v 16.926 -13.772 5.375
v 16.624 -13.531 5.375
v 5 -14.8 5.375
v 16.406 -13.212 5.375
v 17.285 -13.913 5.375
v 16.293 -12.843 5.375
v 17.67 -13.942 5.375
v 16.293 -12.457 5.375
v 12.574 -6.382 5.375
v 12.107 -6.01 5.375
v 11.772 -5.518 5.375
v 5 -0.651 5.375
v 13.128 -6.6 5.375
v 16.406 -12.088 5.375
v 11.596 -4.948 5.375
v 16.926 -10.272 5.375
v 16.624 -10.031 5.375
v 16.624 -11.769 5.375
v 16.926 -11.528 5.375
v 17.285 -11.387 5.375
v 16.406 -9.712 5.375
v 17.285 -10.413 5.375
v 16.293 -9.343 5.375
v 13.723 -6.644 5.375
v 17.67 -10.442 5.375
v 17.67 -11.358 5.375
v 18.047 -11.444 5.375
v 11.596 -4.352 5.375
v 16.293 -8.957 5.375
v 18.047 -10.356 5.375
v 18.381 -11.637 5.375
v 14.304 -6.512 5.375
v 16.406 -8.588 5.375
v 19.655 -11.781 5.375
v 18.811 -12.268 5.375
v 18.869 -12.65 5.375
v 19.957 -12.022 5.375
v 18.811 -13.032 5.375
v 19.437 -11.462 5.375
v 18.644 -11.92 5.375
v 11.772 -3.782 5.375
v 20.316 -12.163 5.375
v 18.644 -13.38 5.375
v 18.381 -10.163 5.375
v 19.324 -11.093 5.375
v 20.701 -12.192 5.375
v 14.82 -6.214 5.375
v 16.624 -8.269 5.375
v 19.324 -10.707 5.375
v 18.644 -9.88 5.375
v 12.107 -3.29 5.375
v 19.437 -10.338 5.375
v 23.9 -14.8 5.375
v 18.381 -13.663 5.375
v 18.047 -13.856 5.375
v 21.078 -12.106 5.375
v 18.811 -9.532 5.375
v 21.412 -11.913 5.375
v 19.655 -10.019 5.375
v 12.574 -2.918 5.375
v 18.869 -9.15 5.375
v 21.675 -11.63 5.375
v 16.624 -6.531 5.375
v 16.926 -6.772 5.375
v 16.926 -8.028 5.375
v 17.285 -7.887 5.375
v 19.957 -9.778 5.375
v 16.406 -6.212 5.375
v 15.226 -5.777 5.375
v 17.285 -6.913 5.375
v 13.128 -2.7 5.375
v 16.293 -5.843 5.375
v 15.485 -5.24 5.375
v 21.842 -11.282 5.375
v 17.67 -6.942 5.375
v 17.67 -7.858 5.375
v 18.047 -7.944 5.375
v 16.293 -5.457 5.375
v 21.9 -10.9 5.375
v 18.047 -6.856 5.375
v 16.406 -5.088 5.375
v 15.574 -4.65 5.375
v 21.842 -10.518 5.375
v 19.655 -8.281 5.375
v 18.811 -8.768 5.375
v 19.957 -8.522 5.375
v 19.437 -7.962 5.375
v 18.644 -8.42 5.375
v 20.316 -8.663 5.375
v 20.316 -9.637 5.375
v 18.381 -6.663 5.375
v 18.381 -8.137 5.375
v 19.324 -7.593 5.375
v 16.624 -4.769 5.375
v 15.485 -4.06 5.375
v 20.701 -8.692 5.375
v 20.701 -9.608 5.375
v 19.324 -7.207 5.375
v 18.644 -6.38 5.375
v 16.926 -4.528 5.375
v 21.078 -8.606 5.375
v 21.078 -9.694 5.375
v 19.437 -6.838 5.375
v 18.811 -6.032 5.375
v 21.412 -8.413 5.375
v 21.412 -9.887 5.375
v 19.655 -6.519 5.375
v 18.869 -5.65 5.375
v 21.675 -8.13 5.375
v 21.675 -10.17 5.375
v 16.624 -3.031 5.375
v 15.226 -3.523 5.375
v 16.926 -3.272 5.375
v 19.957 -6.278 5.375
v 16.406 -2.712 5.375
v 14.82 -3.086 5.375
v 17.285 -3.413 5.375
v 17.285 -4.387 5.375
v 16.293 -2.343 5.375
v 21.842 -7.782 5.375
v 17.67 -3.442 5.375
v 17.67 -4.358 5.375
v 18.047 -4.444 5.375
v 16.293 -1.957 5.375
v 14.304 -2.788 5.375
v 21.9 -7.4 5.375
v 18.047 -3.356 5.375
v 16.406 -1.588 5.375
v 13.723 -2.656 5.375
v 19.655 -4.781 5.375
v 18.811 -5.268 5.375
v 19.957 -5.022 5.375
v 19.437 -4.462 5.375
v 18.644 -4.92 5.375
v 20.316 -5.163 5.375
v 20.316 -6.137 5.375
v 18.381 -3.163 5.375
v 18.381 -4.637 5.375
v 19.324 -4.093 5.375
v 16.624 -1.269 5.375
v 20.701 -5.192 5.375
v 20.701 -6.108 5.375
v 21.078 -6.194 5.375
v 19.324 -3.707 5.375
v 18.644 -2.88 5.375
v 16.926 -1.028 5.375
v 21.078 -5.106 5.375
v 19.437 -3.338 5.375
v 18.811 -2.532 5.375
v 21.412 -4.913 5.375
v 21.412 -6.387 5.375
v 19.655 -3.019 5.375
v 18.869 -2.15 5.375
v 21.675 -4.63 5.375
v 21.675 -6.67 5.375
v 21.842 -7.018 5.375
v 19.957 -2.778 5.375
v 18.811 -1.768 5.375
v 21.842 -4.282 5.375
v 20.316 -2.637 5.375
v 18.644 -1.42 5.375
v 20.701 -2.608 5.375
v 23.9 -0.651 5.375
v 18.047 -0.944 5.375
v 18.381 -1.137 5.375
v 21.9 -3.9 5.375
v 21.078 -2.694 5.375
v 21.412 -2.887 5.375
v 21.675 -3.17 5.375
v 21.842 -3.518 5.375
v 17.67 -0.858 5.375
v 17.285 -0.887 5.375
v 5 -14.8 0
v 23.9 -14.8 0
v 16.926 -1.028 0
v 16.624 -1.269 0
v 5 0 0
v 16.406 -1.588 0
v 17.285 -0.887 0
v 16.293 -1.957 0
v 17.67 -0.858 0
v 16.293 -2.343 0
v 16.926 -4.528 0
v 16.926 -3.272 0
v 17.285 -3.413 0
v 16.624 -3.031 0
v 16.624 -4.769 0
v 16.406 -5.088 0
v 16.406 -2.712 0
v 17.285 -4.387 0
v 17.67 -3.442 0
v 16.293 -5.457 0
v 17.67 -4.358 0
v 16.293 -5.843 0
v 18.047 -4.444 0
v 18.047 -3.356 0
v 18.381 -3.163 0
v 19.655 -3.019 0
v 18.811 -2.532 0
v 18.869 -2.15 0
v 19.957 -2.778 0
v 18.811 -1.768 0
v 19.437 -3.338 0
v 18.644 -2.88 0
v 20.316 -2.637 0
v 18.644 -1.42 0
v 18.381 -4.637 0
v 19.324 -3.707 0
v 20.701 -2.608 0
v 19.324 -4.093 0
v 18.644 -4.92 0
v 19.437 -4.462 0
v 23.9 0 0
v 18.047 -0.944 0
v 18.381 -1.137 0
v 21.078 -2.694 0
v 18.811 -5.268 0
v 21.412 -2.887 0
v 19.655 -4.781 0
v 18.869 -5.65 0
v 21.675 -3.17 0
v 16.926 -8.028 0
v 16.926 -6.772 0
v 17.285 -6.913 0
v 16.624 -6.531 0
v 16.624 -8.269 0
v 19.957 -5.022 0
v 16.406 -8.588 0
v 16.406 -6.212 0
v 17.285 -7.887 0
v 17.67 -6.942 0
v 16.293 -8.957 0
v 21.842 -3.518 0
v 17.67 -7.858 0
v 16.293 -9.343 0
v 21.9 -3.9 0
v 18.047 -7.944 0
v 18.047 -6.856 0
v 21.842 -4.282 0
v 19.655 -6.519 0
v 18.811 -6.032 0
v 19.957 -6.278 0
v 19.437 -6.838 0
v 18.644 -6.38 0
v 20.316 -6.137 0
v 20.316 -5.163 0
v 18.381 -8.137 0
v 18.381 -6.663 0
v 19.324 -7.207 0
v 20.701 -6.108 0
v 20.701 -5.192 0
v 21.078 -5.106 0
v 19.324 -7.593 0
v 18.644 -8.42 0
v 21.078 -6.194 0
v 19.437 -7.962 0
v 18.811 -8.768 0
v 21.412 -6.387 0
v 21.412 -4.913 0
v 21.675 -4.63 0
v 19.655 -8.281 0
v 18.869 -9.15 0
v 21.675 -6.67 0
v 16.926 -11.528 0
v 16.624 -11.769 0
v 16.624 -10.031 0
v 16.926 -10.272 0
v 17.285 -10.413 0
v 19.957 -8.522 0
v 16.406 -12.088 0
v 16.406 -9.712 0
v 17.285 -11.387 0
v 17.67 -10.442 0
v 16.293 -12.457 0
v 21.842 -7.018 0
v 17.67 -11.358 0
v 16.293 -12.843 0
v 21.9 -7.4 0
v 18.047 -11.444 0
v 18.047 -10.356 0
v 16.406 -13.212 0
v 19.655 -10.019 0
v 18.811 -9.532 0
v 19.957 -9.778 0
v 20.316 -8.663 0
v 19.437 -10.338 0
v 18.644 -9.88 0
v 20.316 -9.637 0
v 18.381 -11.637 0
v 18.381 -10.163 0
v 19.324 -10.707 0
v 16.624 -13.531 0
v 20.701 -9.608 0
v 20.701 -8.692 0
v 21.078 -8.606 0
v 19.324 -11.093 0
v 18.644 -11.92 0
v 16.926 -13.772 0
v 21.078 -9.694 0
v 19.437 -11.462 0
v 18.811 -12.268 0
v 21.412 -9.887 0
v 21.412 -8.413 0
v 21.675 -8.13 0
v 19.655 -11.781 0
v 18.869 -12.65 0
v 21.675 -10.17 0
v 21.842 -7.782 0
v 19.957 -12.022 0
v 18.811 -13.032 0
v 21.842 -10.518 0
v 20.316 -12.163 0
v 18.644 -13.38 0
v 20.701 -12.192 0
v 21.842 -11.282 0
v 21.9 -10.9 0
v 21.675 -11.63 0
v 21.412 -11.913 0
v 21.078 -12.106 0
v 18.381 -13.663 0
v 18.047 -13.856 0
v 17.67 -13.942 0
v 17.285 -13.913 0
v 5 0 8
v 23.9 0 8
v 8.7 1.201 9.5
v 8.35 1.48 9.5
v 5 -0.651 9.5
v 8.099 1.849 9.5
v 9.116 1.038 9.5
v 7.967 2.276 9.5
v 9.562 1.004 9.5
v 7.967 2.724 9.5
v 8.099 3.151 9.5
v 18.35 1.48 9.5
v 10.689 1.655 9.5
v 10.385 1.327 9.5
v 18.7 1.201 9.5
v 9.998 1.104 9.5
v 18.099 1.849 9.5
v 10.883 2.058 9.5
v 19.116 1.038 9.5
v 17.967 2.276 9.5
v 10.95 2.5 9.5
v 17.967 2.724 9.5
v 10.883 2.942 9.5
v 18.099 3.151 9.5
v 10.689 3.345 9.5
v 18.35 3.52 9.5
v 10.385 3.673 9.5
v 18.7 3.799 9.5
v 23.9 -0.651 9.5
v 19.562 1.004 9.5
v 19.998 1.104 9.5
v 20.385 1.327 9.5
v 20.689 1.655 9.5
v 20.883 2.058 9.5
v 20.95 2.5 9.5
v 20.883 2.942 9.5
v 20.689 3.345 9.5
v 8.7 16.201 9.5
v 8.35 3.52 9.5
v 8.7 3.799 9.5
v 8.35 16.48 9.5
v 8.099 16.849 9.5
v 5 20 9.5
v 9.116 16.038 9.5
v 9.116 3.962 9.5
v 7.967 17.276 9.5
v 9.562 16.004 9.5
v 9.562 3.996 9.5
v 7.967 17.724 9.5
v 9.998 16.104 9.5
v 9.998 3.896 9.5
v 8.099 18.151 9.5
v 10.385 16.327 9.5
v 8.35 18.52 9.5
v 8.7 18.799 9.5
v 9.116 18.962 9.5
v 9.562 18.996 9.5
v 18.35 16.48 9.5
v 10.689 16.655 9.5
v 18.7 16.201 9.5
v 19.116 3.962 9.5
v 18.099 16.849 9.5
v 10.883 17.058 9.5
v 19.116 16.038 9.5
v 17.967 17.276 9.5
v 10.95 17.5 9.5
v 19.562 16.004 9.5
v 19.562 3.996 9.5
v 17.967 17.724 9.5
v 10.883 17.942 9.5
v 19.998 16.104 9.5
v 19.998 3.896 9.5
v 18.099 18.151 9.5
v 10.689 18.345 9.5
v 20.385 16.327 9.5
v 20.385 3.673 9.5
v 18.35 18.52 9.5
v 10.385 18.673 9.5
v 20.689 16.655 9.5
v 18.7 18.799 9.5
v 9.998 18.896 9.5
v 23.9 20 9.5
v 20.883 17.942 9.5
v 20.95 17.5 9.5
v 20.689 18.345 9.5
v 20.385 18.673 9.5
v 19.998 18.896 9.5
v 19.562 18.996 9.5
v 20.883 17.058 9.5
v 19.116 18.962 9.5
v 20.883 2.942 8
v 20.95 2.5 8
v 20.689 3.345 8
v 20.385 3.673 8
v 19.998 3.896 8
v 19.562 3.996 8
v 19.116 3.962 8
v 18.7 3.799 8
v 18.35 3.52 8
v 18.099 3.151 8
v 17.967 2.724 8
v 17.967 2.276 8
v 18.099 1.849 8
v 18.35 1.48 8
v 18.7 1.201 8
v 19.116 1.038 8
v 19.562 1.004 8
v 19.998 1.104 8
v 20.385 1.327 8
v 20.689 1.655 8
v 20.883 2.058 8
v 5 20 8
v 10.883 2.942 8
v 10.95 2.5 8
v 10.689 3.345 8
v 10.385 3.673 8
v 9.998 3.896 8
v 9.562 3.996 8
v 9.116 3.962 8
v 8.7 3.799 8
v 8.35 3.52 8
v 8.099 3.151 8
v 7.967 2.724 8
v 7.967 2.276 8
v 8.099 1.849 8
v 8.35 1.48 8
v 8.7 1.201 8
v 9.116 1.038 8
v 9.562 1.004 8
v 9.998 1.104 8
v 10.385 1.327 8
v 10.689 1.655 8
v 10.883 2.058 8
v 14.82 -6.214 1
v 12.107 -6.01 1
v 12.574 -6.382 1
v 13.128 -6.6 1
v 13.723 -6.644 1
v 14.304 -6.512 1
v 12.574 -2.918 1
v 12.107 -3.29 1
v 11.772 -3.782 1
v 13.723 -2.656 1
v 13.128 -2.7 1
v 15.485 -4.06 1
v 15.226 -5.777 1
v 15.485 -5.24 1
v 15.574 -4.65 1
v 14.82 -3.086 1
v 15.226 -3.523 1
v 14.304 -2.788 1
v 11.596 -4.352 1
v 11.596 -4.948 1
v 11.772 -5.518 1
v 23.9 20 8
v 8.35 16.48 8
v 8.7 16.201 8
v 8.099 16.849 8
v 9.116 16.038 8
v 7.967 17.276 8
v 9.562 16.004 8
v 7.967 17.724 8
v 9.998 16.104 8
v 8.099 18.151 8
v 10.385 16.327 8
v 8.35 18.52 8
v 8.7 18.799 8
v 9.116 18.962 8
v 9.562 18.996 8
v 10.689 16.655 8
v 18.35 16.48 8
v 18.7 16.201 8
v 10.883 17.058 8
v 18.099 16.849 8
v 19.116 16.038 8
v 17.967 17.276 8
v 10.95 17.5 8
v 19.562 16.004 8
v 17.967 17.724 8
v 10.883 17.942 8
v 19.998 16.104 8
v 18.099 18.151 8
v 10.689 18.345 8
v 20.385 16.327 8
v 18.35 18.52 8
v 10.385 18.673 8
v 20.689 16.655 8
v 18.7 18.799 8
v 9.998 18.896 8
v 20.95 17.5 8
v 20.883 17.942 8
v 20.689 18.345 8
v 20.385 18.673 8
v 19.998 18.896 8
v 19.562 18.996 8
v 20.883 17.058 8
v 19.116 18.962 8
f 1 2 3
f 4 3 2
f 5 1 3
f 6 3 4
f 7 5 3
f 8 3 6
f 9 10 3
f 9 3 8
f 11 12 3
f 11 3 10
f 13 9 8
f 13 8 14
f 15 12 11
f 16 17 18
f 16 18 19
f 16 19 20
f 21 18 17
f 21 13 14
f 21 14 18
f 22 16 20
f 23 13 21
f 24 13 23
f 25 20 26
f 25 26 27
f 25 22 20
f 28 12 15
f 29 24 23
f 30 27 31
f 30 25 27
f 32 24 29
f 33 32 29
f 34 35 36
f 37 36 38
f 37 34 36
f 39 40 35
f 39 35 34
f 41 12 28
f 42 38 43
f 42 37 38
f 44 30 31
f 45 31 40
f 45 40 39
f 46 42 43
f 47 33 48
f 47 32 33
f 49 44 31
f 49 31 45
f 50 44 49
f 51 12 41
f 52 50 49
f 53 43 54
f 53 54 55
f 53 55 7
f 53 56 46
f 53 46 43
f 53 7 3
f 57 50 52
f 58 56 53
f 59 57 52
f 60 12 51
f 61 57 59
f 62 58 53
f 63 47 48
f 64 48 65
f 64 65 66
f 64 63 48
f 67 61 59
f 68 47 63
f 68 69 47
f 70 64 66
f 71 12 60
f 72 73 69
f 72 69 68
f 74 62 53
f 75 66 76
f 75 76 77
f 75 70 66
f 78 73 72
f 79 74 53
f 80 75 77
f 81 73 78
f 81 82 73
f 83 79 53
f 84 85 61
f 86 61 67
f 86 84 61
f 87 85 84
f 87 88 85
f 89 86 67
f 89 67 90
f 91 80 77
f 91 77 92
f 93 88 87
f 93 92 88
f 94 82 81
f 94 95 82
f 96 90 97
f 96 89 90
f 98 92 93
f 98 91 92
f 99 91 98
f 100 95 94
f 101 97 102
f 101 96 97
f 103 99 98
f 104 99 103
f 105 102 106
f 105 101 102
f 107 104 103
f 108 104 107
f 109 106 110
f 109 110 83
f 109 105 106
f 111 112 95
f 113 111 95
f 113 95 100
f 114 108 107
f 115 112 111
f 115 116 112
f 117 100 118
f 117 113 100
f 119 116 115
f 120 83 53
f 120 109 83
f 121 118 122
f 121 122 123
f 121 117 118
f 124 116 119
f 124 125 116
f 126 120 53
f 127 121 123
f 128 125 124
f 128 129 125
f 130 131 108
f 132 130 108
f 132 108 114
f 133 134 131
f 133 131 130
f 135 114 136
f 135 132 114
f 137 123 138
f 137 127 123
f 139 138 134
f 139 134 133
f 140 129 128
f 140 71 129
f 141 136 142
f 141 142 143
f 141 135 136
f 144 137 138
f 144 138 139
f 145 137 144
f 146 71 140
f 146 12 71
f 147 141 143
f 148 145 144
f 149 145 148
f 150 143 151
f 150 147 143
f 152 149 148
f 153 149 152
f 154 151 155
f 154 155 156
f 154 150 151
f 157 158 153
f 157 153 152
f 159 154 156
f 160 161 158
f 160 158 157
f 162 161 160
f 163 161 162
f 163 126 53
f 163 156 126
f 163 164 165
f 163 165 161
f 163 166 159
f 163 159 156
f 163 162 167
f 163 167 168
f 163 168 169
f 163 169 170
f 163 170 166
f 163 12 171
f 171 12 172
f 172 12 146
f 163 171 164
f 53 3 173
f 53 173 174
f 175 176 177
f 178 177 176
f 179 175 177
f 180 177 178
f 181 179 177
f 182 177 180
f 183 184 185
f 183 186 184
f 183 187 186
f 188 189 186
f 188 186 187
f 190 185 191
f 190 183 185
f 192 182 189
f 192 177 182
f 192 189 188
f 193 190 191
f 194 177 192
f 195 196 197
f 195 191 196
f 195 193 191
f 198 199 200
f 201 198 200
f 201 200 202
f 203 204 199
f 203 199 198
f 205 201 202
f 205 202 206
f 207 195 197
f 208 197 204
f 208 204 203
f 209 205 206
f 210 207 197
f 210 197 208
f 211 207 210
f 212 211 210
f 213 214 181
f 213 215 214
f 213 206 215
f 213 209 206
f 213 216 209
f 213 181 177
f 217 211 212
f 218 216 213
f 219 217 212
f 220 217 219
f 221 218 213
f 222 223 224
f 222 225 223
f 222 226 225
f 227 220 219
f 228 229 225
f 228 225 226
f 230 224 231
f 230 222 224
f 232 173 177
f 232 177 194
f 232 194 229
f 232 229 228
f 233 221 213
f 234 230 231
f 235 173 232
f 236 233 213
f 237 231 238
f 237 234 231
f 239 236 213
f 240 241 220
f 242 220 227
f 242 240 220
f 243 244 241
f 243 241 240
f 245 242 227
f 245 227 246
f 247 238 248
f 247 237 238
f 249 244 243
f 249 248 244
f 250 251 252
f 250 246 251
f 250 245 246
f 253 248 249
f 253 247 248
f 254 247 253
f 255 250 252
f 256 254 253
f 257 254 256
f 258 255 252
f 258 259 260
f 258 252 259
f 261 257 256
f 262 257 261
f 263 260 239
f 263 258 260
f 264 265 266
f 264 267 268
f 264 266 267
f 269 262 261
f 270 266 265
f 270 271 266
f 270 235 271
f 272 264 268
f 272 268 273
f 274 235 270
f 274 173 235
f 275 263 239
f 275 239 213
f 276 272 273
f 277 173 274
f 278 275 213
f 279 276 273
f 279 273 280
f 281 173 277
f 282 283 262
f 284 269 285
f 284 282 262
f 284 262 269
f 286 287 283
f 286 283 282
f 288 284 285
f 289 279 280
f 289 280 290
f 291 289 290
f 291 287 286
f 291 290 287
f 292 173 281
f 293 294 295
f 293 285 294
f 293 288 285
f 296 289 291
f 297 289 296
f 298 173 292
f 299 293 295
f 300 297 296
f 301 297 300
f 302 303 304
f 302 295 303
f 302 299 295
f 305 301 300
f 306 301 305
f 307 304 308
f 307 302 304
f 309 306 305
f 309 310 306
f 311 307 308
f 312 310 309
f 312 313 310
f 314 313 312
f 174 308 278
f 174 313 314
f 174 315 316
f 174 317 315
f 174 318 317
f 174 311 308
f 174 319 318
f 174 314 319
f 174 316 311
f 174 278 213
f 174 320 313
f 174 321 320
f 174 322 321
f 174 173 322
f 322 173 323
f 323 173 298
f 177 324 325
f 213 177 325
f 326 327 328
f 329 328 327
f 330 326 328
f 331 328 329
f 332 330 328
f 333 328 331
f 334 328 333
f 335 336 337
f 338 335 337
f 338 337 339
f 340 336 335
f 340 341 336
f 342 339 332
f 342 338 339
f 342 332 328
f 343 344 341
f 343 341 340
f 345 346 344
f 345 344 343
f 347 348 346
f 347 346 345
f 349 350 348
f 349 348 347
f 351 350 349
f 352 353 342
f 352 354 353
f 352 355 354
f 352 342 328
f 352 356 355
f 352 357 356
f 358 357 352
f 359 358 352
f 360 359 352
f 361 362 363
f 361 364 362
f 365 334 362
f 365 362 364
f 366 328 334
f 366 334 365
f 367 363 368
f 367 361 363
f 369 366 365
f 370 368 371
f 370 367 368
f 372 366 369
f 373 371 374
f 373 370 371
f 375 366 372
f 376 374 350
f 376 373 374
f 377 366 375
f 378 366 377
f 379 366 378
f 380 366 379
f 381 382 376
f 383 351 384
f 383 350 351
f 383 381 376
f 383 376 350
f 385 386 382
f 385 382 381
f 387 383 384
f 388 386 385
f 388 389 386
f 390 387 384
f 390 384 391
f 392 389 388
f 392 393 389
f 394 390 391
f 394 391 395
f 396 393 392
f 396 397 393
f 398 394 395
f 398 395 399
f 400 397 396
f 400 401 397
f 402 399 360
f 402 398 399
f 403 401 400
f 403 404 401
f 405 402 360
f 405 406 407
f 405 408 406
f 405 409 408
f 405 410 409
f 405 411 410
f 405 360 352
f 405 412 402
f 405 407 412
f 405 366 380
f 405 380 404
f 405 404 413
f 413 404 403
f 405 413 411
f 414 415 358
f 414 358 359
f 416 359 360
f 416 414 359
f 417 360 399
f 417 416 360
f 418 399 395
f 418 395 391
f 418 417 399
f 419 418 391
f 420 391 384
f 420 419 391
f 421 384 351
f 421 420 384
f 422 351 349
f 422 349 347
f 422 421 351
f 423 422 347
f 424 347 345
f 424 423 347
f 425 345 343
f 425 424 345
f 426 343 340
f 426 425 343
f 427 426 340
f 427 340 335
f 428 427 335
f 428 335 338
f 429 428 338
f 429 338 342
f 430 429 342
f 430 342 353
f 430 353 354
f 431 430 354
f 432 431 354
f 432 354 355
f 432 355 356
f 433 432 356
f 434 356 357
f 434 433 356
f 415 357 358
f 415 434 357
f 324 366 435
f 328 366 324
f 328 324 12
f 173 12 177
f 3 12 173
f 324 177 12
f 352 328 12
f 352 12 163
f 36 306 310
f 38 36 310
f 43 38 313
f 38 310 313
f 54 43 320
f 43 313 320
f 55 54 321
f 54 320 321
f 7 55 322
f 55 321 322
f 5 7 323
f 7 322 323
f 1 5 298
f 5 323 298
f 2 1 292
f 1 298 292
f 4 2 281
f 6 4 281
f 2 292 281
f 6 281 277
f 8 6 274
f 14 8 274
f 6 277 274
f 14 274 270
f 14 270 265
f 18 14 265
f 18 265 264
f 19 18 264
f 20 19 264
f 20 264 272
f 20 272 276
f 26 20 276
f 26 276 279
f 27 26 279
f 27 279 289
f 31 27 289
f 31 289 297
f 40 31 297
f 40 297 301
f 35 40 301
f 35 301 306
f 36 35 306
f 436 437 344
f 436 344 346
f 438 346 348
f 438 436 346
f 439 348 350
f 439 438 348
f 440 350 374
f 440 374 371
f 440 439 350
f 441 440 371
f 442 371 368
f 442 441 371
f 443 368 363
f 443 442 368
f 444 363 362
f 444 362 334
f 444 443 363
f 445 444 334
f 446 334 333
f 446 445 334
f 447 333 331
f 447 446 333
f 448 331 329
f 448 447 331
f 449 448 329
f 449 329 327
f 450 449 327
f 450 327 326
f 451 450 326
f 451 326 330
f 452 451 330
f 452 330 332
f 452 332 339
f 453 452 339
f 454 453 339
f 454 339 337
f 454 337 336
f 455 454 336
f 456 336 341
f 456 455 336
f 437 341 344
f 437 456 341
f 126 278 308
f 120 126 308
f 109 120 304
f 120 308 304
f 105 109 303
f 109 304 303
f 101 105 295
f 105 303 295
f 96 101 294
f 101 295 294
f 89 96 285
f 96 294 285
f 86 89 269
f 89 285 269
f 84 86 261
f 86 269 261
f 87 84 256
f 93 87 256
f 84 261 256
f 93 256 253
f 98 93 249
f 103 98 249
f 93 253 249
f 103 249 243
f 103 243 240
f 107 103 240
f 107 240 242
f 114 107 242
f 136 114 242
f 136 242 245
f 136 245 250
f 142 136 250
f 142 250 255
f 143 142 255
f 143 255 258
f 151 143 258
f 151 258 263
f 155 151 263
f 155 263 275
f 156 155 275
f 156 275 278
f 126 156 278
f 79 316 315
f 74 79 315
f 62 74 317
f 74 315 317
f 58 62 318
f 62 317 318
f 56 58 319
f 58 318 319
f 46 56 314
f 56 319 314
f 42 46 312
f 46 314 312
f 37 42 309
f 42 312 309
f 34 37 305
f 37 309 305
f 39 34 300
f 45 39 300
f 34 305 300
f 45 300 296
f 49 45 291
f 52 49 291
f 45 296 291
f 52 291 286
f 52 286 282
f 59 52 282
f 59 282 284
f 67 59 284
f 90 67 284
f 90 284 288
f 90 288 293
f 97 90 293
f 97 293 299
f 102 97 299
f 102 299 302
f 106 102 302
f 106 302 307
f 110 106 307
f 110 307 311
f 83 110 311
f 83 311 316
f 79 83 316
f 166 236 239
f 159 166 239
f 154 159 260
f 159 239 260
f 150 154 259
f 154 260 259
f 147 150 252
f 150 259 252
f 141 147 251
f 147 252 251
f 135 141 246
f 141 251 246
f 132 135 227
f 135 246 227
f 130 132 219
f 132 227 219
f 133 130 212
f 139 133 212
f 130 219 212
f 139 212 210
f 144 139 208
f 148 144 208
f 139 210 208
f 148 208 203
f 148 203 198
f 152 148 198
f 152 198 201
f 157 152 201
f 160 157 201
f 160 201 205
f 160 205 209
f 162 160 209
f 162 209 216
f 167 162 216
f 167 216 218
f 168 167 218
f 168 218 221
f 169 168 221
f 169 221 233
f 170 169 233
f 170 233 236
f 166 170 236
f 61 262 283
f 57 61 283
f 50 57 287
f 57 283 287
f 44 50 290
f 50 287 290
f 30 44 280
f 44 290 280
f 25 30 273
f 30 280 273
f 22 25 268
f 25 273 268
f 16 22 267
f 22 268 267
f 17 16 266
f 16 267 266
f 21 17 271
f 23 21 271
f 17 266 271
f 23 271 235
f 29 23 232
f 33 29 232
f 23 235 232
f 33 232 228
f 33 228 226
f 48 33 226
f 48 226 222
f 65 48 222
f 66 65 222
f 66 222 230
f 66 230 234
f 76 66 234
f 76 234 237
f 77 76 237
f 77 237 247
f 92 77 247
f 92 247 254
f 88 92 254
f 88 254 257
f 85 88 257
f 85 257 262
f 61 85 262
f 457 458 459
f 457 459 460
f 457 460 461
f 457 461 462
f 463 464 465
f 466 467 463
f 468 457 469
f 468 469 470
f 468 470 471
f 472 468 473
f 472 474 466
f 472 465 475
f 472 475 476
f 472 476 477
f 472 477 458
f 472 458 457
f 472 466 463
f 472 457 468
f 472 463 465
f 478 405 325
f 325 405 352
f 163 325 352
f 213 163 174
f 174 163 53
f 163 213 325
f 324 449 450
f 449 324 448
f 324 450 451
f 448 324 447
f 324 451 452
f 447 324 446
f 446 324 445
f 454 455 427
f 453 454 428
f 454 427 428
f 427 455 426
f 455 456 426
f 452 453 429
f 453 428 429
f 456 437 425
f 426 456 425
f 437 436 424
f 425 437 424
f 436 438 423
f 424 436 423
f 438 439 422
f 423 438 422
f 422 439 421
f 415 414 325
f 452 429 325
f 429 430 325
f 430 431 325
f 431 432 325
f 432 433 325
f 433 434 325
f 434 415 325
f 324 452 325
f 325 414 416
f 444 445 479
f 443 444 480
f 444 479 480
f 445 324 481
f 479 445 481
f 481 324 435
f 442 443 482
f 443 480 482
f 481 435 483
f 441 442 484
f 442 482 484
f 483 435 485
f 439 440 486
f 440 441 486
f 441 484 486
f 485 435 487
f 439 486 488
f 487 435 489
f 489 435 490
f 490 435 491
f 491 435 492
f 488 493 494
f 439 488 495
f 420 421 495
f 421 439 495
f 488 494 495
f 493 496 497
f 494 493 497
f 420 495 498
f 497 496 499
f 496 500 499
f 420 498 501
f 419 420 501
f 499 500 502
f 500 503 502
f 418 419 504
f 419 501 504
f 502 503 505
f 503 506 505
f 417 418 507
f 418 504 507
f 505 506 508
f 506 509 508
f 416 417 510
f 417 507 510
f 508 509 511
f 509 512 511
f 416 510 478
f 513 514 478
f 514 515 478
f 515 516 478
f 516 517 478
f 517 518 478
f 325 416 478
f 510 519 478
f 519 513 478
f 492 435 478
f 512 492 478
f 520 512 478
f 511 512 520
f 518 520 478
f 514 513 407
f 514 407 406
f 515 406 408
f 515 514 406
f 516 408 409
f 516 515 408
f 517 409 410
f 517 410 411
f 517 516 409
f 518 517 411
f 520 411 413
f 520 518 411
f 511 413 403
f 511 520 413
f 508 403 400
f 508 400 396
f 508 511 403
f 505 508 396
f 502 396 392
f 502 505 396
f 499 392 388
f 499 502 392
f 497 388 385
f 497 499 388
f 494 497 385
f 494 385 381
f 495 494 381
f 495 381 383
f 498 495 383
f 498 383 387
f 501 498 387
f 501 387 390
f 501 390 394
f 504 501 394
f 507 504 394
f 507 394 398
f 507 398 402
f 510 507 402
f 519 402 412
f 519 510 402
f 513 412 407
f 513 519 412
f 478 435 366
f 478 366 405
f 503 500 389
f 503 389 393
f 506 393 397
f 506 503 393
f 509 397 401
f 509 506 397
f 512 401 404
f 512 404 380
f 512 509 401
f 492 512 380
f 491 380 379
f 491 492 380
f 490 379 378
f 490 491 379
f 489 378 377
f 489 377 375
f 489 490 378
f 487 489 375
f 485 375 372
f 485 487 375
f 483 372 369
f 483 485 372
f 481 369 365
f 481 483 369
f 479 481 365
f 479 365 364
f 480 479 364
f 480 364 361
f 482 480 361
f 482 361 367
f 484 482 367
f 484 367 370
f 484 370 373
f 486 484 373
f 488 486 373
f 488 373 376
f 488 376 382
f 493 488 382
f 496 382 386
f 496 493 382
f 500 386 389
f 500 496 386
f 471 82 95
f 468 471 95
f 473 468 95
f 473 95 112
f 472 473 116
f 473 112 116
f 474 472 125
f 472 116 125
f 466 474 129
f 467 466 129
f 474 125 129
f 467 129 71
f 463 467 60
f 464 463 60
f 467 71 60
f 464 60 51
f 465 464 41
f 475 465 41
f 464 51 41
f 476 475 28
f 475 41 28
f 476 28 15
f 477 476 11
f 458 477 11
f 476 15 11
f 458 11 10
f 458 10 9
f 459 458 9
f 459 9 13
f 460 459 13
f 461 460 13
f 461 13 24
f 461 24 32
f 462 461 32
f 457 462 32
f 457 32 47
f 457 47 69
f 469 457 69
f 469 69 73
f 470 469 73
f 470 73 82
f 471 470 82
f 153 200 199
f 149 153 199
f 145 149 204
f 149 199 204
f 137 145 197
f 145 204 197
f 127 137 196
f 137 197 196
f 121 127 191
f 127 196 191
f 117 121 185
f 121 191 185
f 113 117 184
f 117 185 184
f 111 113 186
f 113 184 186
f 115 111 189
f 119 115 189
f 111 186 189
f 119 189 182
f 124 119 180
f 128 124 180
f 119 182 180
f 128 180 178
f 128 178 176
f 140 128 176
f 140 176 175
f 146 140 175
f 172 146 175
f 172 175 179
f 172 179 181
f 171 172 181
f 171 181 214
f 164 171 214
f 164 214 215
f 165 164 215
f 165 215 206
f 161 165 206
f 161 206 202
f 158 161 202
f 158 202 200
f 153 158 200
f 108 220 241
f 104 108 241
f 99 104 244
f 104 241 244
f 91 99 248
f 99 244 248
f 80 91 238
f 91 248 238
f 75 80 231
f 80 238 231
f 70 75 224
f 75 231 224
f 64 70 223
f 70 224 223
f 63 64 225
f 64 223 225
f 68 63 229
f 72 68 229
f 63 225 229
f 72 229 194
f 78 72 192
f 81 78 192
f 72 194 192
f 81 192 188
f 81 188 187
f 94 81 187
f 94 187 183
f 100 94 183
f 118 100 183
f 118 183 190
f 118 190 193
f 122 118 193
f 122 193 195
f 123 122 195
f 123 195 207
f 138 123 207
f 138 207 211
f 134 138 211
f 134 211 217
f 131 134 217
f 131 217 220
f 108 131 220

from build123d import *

# Parameters (mm, degrees)
SKETCH_W        = 18.9
SKETCH_H        = 34.8
SKETCH_R        = 1.5
PAD_DEPTH       = 1.5
SKETCH001_W     = 18.9
SKETCH001_H     = 14.8
PAD001_DEPTH    = 8
SKETCH002_R     = 1.2954
POCKET_DEPTH    = 9.501
SKETCH003_R     = 2
POCKET001_DEPTH = 8.5
SKETCH004_R     = 1.5
POCKET002_DEPTH = 1.001
SKETCH005_W     = 18.9
SKETCH005_H     = 14.1486
POCKET003_DEPTH = 4.1246


with BuildPart() as part:
    # Sketch (on Face6 of Binder) → Pad (new body)
    with BuildSketch(Plane.XY.offset(8)):
        with Locations((14.45, 2.6)):
            Rectangle(SKETCH_W, SKETCH_H)
        with Locations((9.45, 17.5)):
            Circle(SKETCH_R, mode=Mode.SUBTRACT)
        with Locations((9.45, 2.5)):
            Circle(SKETCH_R, mode=Mode.SUBTRACT)
        with Locations((19.45, 2.5)):
            Circle(SKETCH_R, mode=Mode.SUBTRACT)
        with Locations((19.45, 17.5)):
            Circle(SKETCH_R, mode=Mode.SUBTRACT)
    extrude(amount=PAD_DEPTH)

    # Sketch001 (on Face9 of Pad) → Pad001 (join)
    with BuildSketch(Plane(origin=(0, 0, 8), x_dir=(1, 0, 0), z_dir=(0, 0, -1))):
        with Locations((14.45, 7.4)):
            Rectangle(SKETCH001_W, SKETCH001_H)
    extrude(amount=PAD001_DEPTH)

    # Sketch002 (on Face15 of Pad001) → Pocket (cut, through all)
    with BuildSketch(Plane(origin=(0, 0, 0), x_dir=(1, 0, 0), z_dir=(0, 0, -1))):
        with Locations((17.573511, 2.15)):
            Circle(SKETCH002_R)
        with Locations((20.6046, 3.9)):
            Circle(SKETCH002_R)
        with Locations((17.573511, 5.65)):
            Circle(SKETCH002_R)
        with Locations((17.573511, 9.15)):
            Circle(SKETCH002_R)
        with Locations((20.6046, 10.9)):
            Circle(SKETCH002_R)
        with Locations((20.6046, 7.4)):
            Circle(SKETCH002_R)
        with Locations((17.573511, 12.65)):
            Circle(SKETCH002_R)
    extrude(amount=-POCKET_DEPTH, mode=Mode.SUBTRACT)

    # Sketch003 (on Face5 of Pocket) → Pocket001 (cut)
    with BuildSketch(Plane.XY.offset(9.5)):
        with Locations((13.573511, -4.65)):
            Circle(SKETCH003_R)
    extrude(amount=-POCKET001_DEPTH, mode=Mode.SUBTRACT)

    # Sketch004 (on Face24 of Pocket001) → Pocket002 (cut, through all)
    with BuildSketch(Plane.XY.offset(1)):
        with Locations((9.45, 2.5)):
            Circle(SKETCH004_R)
    extrude(amount=-POCKET002_DEPTH, mode=Mode.SUBTRACT)

    # Sketch005 (on Face5 of Pocket002) → Pocket003 (cut)
    with BuildSketch(Plane.XY.offset(9.5)):
        with Locations((14.45, -7.7257)):
            Rectangle(SKETCH005_W, SKETCH005_H)
    extrude(amount=-POCKET003_DEPTH, mode=Mode.SUBTRACT)


solid = part.part
